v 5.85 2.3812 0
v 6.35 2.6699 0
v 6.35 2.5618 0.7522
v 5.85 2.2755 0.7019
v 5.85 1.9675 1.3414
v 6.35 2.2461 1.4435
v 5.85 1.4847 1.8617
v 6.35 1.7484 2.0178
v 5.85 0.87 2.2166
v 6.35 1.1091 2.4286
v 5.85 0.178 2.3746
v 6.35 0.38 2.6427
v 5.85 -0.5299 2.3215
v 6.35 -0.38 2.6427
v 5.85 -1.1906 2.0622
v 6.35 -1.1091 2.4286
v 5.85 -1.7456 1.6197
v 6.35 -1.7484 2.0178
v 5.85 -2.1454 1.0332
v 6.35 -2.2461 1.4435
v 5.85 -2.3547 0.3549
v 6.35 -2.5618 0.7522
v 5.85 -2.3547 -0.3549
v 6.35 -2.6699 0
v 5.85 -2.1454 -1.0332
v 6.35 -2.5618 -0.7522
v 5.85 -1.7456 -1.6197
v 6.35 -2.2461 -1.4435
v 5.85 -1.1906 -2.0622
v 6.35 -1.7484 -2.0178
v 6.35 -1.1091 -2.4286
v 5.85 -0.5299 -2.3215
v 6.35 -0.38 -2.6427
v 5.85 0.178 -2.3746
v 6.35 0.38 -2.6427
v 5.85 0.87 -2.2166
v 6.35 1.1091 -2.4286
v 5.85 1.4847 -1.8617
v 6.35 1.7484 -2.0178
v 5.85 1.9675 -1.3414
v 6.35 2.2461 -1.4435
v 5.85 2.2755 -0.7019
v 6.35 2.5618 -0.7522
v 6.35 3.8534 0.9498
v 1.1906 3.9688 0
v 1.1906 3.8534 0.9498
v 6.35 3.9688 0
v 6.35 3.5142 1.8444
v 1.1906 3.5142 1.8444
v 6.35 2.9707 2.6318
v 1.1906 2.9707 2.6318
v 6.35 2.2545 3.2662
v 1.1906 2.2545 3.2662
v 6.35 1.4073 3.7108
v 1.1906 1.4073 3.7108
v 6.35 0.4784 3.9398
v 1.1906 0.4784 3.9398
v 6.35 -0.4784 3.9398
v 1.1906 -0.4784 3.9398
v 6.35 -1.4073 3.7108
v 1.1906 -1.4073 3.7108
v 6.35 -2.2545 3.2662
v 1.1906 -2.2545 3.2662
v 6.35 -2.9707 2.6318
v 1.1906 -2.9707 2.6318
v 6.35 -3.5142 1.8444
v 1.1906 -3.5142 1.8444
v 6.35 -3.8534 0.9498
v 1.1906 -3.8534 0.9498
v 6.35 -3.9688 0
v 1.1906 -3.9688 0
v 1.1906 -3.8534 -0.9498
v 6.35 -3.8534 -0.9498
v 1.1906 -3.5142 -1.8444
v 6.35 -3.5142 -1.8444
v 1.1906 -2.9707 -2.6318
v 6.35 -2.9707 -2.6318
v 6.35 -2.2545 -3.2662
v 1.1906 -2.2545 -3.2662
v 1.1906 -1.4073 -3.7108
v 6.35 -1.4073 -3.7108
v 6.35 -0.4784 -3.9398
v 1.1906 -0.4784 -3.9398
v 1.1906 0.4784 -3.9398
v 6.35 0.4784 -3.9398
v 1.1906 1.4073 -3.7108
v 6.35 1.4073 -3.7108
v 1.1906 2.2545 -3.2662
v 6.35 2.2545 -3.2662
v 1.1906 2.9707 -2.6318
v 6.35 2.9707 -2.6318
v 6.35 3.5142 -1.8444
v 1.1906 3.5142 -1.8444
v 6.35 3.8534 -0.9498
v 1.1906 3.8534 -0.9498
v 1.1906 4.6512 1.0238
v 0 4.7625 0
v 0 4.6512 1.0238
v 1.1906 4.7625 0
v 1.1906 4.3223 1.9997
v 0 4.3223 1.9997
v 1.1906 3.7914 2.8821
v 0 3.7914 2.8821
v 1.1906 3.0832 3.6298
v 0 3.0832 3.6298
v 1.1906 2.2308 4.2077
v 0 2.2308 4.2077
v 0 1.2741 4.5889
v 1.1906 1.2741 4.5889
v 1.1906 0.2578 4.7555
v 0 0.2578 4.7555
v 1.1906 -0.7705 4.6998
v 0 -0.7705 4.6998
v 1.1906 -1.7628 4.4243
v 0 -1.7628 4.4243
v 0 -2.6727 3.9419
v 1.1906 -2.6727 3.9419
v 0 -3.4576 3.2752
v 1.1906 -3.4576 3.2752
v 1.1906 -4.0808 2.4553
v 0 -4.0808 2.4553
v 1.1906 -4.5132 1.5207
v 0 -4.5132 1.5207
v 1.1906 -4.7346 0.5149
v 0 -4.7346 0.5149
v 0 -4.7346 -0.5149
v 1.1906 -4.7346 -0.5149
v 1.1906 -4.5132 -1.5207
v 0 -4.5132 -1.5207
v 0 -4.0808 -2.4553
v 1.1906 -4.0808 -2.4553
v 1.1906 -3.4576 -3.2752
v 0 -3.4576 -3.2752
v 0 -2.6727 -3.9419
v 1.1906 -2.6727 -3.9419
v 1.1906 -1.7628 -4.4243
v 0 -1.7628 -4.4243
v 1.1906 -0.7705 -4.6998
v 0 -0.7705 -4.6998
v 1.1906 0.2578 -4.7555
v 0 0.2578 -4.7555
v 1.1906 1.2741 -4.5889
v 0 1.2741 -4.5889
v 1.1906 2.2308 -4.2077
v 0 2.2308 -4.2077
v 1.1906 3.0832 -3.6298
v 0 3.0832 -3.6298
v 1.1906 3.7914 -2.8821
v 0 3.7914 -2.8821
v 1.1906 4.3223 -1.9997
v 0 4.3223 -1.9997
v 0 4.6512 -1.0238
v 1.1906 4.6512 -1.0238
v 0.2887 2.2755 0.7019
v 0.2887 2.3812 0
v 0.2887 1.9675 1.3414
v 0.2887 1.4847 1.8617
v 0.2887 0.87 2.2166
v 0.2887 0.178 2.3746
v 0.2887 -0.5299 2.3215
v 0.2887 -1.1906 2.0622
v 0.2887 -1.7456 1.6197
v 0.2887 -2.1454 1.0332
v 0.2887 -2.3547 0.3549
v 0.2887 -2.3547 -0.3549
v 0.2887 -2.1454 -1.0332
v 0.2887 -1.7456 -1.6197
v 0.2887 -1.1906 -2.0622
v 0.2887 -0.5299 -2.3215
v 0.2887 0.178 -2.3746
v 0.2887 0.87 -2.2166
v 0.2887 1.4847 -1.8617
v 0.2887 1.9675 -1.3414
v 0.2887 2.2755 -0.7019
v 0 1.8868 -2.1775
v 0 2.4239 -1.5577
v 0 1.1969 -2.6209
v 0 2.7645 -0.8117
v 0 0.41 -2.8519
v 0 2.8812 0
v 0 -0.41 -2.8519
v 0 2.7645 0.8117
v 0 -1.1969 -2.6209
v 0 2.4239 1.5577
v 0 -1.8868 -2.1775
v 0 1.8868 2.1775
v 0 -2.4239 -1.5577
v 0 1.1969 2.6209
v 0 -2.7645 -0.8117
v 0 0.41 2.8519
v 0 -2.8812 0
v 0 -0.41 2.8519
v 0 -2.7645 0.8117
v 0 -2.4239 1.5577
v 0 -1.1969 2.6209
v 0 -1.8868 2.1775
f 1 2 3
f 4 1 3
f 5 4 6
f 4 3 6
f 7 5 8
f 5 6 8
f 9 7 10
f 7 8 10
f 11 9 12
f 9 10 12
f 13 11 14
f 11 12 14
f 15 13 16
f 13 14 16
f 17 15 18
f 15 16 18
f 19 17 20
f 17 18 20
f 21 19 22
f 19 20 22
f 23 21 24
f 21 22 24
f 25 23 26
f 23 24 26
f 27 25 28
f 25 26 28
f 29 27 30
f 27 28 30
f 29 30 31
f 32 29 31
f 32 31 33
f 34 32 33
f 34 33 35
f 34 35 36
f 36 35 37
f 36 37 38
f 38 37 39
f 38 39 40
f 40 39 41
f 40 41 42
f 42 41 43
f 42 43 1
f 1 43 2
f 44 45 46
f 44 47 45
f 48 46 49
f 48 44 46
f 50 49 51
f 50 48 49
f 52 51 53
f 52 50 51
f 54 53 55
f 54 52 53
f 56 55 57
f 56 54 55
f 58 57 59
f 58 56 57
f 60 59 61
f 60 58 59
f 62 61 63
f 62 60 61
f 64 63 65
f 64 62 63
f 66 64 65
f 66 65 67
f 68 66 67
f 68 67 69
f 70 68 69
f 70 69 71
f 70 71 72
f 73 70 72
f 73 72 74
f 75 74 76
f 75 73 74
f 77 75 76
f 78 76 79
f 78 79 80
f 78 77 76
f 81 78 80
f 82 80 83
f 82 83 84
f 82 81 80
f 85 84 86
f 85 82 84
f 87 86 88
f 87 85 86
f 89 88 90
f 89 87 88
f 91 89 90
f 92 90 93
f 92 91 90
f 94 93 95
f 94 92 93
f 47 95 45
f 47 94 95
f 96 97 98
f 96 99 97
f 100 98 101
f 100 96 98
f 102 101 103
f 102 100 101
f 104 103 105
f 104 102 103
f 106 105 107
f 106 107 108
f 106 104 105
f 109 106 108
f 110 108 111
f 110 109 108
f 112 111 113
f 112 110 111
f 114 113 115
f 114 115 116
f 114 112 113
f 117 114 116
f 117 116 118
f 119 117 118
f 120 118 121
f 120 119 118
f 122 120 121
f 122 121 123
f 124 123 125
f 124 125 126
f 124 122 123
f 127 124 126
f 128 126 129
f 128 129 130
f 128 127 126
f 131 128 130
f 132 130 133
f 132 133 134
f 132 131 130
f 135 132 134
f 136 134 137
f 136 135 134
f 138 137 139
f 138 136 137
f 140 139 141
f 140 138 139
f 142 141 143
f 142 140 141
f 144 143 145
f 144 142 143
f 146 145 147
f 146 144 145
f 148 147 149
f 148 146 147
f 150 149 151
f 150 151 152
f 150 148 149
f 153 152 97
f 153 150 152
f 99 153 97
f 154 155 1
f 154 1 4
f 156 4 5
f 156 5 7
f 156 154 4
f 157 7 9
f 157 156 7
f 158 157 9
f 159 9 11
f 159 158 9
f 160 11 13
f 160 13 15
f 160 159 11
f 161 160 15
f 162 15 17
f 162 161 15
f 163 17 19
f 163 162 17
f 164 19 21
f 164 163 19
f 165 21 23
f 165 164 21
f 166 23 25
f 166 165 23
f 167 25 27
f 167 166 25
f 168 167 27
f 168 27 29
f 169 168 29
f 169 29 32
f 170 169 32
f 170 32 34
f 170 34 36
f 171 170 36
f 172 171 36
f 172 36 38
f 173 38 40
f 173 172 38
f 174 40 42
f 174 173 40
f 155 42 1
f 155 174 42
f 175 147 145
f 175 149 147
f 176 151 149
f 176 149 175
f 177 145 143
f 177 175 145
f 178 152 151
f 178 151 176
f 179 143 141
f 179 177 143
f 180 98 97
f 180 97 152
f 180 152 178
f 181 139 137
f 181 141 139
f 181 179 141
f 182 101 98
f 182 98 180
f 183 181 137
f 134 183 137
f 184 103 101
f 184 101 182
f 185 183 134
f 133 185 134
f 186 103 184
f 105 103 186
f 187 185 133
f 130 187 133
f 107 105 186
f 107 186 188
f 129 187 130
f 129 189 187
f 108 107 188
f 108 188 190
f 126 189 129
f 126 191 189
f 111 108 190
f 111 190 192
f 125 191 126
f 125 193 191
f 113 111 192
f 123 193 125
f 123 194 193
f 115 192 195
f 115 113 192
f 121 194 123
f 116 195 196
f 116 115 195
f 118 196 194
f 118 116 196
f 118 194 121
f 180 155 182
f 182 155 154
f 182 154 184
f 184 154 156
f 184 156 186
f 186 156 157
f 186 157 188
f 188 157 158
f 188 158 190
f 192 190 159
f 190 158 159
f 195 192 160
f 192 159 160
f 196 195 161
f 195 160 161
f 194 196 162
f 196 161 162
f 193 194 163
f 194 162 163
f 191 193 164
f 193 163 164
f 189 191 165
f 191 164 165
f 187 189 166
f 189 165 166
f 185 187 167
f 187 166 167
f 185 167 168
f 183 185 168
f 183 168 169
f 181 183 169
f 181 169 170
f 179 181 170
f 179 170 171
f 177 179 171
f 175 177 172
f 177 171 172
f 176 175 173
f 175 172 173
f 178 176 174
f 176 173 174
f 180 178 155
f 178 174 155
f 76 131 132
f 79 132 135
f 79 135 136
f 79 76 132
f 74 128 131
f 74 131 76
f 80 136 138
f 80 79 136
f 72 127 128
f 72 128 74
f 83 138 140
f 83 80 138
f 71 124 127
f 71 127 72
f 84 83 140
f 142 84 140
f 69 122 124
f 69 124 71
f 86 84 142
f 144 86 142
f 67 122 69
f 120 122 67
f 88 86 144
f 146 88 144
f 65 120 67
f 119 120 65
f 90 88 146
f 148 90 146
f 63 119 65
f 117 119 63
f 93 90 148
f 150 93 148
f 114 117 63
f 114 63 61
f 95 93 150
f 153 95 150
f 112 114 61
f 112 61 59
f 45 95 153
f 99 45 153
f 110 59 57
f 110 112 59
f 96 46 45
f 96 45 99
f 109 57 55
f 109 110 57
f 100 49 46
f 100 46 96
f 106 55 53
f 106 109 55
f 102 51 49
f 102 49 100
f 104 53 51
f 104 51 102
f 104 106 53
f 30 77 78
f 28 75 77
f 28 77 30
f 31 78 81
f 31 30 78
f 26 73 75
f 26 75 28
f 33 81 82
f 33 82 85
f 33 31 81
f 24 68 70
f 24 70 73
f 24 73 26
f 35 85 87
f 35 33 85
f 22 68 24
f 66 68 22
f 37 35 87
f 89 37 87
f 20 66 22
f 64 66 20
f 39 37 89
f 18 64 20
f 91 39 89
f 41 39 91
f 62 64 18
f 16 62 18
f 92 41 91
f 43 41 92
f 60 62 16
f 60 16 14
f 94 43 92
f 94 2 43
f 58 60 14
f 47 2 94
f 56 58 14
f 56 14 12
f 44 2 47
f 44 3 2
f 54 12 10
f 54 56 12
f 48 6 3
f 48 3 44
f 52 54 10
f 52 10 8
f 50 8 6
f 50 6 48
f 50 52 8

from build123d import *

# Parameters (mm, degrees)
CHAMFER1_SIZE         = 0.5
CHAMFER1_SIZE2        = 0.288675135
CHAMFER1_PART_2_SIZE  = 0.5
CHAMFER1_PART_2_SIZE2 = 0.288675135


with BuildPart() as part:
    # Sketch1 → Revolve1 (revolve)
    with BuildSketch(Plane.XY):
        Polygon((0, 2.38125), (0, 4.7625), (1.190625, 4.7625), (1.190625, 3.96875), (6.35, 3.96875), (6.35, 2.38125), align=None)
    revolve(axis=Axis((0, 0, 0), (1, 0, 0)))

    # Chamfer1
    chamfer1_edges = [part.edges().sort_by_distance(p)[0] for p in [
        (6.35, -2.38125, 0),
    ]]
    chamfer1_side = [part.faces().sort_by_distance(p)[0] for p in [
        (3.175, -2.38125, 0),
    ]]
    chamfer(chamfer1_edges, length=CHAMFER1_SIZE, length2=CHAMFER1_SIZE2, reference=chamfer1_side[0])

    # Chamfer1 part 2
    chamfer1_part_2_edges = [part.edges().sort_by_distance(p)[0] for p in [
        (0, -2.38125, 0),
    ]]
    chamfer1_part_2_side = [part.faces().sort_by_distance(p)[0] for p in [
        (0, -2.515953842, 0),
    ]]
    chamfer(chamfer1_part_2_edges, length=CHAMFER1_PART_2_SIZE, length2=CHAMFER1_PART_2_SIZE2, reference=chamfer1_part_2_side[0])


solid = part.part
